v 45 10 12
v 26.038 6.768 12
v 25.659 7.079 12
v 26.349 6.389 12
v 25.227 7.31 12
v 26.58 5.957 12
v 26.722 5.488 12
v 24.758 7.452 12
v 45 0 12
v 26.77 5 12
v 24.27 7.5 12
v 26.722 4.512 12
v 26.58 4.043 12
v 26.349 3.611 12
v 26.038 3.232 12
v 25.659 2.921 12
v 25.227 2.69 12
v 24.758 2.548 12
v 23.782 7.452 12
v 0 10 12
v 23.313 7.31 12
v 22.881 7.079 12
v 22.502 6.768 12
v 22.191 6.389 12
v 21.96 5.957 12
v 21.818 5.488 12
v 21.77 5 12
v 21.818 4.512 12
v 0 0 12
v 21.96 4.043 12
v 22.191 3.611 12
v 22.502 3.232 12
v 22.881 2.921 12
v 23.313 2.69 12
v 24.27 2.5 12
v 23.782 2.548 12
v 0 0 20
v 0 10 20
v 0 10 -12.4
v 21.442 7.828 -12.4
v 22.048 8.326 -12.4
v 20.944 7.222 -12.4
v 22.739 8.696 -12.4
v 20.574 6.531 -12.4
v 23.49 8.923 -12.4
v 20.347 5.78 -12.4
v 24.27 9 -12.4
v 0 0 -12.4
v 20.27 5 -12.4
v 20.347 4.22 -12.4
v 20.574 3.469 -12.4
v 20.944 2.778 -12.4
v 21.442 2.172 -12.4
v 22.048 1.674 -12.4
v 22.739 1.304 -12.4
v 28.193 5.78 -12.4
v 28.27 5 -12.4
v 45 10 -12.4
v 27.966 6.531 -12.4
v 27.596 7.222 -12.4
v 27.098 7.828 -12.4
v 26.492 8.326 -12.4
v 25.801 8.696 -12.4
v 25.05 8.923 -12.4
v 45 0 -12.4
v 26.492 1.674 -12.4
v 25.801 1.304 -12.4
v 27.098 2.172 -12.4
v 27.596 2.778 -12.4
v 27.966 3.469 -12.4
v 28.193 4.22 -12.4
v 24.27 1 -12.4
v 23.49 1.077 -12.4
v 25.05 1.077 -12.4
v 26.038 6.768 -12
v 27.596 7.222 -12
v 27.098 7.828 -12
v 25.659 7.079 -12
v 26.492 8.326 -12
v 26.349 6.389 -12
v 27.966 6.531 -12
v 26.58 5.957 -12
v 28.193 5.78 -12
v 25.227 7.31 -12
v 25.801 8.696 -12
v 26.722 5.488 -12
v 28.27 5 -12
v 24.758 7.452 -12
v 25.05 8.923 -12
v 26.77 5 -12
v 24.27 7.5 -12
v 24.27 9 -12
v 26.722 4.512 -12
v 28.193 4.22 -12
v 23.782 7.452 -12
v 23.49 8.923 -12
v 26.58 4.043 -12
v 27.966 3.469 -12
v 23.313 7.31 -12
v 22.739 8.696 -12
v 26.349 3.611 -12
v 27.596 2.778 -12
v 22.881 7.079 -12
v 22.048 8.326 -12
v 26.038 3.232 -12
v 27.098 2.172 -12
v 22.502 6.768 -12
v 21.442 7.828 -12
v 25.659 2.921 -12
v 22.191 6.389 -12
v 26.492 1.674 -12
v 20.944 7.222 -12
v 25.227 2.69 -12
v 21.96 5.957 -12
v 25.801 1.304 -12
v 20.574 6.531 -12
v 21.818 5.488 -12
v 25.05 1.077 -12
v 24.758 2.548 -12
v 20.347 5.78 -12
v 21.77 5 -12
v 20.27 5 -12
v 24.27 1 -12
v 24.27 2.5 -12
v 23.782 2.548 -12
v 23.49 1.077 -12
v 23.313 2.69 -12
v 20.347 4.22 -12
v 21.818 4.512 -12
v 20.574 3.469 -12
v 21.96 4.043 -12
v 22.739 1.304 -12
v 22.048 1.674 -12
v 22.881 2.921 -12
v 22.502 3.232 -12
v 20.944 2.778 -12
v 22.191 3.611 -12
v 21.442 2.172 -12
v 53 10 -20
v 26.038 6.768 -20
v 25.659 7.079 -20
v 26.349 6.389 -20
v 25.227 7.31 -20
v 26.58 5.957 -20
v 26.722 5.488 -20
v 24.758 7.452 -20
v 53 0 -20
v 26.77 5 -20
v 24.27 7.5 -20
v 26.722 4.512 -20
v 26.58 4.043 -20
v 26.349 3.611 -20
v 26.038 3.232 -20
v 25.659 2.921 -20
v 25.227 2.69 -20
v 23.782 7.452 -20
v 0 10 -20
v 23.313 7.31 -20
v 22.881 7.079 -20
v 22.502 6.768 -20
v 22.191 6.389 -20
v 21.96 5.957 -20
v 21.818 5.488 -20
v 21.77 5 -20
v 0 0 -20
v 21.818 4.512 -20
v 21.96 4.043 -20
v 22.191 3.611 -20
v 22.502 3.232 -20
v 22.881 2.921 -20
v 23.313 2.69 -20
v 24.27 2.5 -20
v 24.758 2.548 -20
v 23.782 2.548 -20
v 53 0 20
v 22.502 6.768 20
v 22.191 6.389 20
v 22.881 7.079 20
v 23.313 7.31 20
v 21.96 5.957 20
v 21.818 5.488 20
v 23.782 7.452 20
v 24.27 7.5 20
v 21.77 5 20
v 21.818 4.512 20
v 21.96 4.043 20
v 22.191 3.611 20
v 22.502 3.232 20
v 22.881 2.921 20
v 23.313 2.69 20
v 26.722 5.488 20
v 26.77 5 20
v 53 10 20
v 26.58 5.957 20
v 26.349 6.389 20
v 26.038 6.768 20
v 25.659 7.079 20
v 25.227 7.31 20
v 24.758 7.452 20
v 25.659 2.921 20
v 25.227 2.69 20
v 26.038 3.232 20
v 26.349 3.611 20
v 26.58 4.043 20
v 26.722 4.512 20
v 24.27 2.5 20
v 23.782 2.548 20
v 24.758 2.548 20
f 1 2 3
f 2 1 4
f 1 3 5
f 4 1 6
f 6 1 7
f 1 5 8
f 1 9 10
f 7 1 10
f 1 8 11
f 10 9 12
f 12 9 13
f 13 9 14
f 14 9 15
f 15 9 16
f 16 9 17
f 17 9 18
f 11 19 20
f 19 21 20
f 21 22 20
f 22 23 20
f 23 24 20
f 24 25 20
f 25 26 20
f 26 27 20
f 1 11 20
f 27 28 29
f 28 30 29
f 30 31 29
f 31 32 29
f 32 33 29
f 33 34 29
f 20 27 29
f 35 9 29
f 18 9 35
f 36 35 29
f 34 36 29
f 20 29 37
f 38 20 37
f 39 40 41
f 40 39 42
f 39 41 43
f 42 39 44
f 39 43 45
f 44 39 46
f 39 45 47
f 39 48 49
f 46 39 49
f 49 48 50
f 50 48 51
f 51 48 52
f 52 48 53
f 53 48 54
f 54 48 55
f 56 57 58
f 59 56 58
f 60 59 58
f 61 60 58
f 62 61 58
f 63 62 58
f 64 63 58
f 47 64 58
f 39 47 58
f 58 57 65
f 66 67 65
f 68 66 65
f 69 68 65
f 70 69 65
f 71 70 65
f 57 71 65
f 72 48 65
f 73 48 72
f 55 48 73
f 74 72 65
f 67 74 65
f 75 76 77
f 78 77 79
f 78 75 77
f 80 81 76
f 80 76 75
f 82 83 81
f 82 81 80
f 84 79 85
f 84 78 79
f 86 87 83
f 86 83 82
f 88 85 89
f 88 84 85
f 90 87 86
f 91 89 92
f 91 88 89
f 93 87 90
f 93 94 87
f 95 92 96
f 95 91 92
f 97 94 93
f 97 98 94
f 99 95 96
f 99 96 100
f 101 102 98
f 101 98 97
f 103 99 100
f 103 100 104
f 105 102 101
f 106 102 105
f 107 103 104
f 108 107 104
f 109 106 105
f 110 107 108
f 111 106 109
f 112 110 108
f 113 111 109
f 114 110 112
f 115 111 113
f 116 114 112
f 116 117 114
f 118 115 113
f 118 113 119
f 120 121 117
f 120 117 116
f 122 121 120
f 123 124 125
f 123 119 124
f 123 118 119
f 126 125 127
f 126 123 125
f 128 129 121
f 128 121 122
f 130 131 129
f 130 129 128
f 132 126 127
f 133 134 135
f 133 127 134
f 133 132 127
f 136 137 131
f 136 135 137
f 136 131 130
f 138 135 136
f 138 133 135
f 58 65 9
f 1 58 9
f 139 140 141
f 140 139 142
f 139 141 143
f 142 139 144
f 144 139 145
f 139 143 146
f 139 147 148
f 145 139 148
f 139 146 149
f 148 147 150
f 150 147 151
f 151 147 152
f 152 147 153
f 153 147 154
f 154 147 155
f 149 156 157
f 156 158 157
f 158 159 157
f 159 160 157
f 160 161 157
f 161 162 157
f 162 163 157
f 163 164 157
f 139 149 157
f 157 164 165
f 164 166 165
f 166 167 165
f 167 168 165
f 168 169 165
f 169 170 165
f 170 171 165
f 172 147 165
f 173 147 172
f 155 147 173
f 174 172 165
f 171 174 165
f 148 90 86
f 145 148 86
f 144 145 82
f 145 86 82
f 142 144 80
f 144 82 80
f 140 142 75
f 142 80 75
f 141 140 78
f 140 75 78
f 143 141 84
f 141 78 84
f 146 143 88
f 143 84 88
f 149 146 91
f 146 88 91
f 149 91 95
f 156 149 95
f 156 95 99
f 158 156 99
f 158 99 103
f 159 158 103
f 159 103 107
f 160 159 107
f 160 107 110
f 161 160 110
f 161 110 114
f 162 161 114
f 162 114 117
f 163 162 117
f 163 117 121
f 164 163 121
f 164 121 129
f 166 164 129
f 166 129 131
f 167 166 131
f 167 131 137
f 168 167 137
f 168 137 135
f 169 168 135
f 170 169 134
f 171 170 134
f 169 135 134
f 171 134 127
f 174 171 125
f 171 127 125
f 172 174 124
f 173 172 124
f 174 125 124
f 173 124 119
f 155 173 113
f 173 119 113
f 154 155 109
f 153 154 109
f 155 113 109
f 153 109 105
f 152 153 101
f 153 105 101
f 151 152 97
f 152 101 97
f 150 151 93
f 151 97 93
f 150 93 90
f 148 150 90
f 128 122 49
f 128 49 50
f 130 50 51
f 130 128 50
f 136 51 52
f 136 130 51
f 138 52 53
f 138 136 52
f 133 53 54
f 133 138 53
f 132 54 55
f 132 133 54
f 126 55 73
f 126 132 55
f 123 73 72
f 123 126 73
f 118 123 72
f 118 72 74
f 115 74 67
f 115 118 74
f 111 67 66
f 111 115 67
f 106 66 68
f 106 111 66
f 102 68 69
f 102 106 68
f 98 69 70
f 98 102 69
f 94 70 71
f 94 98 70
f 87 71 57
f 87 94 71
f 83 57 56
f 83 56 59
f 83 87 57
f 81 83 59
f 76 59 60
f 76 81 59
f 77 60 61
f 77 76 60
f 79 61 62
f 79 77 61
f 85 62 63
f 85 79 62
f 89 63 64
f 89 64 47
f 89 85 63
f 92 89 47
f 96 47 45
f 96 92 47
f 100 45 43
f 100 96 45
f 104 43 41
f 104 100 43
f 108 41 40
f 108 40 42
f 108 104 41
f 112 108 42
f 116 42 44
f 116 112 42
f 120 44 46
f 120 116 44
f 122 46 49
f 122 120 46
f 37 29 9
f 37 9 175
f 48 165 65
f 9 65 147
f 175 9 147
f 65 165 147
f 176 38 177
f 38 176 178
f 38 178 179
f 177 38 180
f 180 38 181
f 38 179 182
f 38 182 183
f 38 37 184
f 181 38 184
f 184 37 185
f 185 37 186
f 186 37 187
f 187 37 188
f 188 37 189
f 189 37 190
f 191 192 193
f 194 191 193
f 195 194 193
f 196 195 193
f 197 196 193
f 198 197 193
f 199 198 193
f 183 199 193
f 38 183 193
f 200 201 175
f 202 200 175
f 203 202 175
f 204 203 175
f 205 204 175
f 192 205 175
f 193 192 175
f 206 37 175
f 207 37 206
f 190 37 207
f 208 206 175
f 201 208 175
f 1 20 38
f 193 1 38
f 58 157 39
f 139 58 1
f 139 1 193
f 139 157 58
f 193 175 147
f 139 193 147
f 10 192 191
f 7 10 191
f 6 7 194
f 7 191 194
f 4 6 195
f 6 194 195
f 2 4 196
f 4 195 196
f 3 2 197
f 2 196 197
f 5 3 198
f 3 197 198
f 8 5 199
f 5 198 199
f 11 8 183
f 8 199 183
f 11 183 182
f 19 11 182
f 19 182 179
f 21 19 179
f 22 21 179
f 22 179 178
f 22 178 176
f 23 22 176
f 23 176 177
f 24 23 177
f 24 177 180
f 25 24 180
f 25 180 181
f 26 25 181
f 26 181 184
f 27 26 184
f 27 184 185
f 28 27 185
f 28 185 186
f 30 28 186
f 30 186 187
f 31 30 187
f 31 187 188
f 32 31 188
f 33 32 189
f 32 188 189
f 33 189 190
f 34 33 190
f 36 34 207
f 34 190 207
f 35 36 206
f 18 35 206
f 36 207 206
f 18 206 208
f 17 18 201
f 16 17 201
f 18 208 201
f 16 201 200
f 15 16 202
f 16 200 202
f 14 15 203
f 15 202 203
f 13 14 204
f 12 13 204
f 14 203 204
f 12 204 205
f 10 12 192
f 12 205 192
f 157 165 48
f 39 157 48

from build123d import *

# Parameters (mm, degrees)
BOSS_EXTRUDE1_DEPTH = 10
SKETCH2_R           = 2.5
CUT_EXTRUDE1_DEPTH  = 59
BOSS_EXTRUDE2_START = 0.4
SKETCH3_R           = 4
SKETCH3_R_2         = 2.5
BOSS_EXTRUDE2_DEPTH = 0.4


with BuildPart() as part:
    # Sketch1 → Boss-Extrude1 (new body)
    with BuildSketch(Plane(origin=(0, 0, 0), x_dir=(1, 0, 0), z_dir=(0, 1, 0))):
        Polygon((0, -12), (0, -20), (53, -20), (53, 20), (0, 20), (0, 12.4), (45, 12.4), (45, 12), (45, -12), align=None)
    extrude(amount=BOSS_EXTRUDE1_DEPTH)

    # Sketch2 → Cut-Extrude1 (cut)
    with BuildSketch(Plane.XY.offset(20)):
        with Locations((24.27, 5)):
            Circle(SKETCH2_R)
    extrude(amount=-CUT_EXTRUDE1_DEPTH, mode=Mode.SUBTRACT)

    # Sketch3 → Boss-Extrude2 (add)
    with BuildSketch(Plane.XY.offset(-12.4).offset(BOSS_EXTRUDE2_START)):
        with Locations(Location((24.27, 5, 0), (0, 0, 180))):
            Circle(SKETCH3_R)
        with Locations((24.27, 5)):
            Circle(SKETCH3_R_2, mode=Mode.SUBTRACT)
    extrude(amount=-BOSS_EXTRUDE2_DEPTH)


solid = part.part
